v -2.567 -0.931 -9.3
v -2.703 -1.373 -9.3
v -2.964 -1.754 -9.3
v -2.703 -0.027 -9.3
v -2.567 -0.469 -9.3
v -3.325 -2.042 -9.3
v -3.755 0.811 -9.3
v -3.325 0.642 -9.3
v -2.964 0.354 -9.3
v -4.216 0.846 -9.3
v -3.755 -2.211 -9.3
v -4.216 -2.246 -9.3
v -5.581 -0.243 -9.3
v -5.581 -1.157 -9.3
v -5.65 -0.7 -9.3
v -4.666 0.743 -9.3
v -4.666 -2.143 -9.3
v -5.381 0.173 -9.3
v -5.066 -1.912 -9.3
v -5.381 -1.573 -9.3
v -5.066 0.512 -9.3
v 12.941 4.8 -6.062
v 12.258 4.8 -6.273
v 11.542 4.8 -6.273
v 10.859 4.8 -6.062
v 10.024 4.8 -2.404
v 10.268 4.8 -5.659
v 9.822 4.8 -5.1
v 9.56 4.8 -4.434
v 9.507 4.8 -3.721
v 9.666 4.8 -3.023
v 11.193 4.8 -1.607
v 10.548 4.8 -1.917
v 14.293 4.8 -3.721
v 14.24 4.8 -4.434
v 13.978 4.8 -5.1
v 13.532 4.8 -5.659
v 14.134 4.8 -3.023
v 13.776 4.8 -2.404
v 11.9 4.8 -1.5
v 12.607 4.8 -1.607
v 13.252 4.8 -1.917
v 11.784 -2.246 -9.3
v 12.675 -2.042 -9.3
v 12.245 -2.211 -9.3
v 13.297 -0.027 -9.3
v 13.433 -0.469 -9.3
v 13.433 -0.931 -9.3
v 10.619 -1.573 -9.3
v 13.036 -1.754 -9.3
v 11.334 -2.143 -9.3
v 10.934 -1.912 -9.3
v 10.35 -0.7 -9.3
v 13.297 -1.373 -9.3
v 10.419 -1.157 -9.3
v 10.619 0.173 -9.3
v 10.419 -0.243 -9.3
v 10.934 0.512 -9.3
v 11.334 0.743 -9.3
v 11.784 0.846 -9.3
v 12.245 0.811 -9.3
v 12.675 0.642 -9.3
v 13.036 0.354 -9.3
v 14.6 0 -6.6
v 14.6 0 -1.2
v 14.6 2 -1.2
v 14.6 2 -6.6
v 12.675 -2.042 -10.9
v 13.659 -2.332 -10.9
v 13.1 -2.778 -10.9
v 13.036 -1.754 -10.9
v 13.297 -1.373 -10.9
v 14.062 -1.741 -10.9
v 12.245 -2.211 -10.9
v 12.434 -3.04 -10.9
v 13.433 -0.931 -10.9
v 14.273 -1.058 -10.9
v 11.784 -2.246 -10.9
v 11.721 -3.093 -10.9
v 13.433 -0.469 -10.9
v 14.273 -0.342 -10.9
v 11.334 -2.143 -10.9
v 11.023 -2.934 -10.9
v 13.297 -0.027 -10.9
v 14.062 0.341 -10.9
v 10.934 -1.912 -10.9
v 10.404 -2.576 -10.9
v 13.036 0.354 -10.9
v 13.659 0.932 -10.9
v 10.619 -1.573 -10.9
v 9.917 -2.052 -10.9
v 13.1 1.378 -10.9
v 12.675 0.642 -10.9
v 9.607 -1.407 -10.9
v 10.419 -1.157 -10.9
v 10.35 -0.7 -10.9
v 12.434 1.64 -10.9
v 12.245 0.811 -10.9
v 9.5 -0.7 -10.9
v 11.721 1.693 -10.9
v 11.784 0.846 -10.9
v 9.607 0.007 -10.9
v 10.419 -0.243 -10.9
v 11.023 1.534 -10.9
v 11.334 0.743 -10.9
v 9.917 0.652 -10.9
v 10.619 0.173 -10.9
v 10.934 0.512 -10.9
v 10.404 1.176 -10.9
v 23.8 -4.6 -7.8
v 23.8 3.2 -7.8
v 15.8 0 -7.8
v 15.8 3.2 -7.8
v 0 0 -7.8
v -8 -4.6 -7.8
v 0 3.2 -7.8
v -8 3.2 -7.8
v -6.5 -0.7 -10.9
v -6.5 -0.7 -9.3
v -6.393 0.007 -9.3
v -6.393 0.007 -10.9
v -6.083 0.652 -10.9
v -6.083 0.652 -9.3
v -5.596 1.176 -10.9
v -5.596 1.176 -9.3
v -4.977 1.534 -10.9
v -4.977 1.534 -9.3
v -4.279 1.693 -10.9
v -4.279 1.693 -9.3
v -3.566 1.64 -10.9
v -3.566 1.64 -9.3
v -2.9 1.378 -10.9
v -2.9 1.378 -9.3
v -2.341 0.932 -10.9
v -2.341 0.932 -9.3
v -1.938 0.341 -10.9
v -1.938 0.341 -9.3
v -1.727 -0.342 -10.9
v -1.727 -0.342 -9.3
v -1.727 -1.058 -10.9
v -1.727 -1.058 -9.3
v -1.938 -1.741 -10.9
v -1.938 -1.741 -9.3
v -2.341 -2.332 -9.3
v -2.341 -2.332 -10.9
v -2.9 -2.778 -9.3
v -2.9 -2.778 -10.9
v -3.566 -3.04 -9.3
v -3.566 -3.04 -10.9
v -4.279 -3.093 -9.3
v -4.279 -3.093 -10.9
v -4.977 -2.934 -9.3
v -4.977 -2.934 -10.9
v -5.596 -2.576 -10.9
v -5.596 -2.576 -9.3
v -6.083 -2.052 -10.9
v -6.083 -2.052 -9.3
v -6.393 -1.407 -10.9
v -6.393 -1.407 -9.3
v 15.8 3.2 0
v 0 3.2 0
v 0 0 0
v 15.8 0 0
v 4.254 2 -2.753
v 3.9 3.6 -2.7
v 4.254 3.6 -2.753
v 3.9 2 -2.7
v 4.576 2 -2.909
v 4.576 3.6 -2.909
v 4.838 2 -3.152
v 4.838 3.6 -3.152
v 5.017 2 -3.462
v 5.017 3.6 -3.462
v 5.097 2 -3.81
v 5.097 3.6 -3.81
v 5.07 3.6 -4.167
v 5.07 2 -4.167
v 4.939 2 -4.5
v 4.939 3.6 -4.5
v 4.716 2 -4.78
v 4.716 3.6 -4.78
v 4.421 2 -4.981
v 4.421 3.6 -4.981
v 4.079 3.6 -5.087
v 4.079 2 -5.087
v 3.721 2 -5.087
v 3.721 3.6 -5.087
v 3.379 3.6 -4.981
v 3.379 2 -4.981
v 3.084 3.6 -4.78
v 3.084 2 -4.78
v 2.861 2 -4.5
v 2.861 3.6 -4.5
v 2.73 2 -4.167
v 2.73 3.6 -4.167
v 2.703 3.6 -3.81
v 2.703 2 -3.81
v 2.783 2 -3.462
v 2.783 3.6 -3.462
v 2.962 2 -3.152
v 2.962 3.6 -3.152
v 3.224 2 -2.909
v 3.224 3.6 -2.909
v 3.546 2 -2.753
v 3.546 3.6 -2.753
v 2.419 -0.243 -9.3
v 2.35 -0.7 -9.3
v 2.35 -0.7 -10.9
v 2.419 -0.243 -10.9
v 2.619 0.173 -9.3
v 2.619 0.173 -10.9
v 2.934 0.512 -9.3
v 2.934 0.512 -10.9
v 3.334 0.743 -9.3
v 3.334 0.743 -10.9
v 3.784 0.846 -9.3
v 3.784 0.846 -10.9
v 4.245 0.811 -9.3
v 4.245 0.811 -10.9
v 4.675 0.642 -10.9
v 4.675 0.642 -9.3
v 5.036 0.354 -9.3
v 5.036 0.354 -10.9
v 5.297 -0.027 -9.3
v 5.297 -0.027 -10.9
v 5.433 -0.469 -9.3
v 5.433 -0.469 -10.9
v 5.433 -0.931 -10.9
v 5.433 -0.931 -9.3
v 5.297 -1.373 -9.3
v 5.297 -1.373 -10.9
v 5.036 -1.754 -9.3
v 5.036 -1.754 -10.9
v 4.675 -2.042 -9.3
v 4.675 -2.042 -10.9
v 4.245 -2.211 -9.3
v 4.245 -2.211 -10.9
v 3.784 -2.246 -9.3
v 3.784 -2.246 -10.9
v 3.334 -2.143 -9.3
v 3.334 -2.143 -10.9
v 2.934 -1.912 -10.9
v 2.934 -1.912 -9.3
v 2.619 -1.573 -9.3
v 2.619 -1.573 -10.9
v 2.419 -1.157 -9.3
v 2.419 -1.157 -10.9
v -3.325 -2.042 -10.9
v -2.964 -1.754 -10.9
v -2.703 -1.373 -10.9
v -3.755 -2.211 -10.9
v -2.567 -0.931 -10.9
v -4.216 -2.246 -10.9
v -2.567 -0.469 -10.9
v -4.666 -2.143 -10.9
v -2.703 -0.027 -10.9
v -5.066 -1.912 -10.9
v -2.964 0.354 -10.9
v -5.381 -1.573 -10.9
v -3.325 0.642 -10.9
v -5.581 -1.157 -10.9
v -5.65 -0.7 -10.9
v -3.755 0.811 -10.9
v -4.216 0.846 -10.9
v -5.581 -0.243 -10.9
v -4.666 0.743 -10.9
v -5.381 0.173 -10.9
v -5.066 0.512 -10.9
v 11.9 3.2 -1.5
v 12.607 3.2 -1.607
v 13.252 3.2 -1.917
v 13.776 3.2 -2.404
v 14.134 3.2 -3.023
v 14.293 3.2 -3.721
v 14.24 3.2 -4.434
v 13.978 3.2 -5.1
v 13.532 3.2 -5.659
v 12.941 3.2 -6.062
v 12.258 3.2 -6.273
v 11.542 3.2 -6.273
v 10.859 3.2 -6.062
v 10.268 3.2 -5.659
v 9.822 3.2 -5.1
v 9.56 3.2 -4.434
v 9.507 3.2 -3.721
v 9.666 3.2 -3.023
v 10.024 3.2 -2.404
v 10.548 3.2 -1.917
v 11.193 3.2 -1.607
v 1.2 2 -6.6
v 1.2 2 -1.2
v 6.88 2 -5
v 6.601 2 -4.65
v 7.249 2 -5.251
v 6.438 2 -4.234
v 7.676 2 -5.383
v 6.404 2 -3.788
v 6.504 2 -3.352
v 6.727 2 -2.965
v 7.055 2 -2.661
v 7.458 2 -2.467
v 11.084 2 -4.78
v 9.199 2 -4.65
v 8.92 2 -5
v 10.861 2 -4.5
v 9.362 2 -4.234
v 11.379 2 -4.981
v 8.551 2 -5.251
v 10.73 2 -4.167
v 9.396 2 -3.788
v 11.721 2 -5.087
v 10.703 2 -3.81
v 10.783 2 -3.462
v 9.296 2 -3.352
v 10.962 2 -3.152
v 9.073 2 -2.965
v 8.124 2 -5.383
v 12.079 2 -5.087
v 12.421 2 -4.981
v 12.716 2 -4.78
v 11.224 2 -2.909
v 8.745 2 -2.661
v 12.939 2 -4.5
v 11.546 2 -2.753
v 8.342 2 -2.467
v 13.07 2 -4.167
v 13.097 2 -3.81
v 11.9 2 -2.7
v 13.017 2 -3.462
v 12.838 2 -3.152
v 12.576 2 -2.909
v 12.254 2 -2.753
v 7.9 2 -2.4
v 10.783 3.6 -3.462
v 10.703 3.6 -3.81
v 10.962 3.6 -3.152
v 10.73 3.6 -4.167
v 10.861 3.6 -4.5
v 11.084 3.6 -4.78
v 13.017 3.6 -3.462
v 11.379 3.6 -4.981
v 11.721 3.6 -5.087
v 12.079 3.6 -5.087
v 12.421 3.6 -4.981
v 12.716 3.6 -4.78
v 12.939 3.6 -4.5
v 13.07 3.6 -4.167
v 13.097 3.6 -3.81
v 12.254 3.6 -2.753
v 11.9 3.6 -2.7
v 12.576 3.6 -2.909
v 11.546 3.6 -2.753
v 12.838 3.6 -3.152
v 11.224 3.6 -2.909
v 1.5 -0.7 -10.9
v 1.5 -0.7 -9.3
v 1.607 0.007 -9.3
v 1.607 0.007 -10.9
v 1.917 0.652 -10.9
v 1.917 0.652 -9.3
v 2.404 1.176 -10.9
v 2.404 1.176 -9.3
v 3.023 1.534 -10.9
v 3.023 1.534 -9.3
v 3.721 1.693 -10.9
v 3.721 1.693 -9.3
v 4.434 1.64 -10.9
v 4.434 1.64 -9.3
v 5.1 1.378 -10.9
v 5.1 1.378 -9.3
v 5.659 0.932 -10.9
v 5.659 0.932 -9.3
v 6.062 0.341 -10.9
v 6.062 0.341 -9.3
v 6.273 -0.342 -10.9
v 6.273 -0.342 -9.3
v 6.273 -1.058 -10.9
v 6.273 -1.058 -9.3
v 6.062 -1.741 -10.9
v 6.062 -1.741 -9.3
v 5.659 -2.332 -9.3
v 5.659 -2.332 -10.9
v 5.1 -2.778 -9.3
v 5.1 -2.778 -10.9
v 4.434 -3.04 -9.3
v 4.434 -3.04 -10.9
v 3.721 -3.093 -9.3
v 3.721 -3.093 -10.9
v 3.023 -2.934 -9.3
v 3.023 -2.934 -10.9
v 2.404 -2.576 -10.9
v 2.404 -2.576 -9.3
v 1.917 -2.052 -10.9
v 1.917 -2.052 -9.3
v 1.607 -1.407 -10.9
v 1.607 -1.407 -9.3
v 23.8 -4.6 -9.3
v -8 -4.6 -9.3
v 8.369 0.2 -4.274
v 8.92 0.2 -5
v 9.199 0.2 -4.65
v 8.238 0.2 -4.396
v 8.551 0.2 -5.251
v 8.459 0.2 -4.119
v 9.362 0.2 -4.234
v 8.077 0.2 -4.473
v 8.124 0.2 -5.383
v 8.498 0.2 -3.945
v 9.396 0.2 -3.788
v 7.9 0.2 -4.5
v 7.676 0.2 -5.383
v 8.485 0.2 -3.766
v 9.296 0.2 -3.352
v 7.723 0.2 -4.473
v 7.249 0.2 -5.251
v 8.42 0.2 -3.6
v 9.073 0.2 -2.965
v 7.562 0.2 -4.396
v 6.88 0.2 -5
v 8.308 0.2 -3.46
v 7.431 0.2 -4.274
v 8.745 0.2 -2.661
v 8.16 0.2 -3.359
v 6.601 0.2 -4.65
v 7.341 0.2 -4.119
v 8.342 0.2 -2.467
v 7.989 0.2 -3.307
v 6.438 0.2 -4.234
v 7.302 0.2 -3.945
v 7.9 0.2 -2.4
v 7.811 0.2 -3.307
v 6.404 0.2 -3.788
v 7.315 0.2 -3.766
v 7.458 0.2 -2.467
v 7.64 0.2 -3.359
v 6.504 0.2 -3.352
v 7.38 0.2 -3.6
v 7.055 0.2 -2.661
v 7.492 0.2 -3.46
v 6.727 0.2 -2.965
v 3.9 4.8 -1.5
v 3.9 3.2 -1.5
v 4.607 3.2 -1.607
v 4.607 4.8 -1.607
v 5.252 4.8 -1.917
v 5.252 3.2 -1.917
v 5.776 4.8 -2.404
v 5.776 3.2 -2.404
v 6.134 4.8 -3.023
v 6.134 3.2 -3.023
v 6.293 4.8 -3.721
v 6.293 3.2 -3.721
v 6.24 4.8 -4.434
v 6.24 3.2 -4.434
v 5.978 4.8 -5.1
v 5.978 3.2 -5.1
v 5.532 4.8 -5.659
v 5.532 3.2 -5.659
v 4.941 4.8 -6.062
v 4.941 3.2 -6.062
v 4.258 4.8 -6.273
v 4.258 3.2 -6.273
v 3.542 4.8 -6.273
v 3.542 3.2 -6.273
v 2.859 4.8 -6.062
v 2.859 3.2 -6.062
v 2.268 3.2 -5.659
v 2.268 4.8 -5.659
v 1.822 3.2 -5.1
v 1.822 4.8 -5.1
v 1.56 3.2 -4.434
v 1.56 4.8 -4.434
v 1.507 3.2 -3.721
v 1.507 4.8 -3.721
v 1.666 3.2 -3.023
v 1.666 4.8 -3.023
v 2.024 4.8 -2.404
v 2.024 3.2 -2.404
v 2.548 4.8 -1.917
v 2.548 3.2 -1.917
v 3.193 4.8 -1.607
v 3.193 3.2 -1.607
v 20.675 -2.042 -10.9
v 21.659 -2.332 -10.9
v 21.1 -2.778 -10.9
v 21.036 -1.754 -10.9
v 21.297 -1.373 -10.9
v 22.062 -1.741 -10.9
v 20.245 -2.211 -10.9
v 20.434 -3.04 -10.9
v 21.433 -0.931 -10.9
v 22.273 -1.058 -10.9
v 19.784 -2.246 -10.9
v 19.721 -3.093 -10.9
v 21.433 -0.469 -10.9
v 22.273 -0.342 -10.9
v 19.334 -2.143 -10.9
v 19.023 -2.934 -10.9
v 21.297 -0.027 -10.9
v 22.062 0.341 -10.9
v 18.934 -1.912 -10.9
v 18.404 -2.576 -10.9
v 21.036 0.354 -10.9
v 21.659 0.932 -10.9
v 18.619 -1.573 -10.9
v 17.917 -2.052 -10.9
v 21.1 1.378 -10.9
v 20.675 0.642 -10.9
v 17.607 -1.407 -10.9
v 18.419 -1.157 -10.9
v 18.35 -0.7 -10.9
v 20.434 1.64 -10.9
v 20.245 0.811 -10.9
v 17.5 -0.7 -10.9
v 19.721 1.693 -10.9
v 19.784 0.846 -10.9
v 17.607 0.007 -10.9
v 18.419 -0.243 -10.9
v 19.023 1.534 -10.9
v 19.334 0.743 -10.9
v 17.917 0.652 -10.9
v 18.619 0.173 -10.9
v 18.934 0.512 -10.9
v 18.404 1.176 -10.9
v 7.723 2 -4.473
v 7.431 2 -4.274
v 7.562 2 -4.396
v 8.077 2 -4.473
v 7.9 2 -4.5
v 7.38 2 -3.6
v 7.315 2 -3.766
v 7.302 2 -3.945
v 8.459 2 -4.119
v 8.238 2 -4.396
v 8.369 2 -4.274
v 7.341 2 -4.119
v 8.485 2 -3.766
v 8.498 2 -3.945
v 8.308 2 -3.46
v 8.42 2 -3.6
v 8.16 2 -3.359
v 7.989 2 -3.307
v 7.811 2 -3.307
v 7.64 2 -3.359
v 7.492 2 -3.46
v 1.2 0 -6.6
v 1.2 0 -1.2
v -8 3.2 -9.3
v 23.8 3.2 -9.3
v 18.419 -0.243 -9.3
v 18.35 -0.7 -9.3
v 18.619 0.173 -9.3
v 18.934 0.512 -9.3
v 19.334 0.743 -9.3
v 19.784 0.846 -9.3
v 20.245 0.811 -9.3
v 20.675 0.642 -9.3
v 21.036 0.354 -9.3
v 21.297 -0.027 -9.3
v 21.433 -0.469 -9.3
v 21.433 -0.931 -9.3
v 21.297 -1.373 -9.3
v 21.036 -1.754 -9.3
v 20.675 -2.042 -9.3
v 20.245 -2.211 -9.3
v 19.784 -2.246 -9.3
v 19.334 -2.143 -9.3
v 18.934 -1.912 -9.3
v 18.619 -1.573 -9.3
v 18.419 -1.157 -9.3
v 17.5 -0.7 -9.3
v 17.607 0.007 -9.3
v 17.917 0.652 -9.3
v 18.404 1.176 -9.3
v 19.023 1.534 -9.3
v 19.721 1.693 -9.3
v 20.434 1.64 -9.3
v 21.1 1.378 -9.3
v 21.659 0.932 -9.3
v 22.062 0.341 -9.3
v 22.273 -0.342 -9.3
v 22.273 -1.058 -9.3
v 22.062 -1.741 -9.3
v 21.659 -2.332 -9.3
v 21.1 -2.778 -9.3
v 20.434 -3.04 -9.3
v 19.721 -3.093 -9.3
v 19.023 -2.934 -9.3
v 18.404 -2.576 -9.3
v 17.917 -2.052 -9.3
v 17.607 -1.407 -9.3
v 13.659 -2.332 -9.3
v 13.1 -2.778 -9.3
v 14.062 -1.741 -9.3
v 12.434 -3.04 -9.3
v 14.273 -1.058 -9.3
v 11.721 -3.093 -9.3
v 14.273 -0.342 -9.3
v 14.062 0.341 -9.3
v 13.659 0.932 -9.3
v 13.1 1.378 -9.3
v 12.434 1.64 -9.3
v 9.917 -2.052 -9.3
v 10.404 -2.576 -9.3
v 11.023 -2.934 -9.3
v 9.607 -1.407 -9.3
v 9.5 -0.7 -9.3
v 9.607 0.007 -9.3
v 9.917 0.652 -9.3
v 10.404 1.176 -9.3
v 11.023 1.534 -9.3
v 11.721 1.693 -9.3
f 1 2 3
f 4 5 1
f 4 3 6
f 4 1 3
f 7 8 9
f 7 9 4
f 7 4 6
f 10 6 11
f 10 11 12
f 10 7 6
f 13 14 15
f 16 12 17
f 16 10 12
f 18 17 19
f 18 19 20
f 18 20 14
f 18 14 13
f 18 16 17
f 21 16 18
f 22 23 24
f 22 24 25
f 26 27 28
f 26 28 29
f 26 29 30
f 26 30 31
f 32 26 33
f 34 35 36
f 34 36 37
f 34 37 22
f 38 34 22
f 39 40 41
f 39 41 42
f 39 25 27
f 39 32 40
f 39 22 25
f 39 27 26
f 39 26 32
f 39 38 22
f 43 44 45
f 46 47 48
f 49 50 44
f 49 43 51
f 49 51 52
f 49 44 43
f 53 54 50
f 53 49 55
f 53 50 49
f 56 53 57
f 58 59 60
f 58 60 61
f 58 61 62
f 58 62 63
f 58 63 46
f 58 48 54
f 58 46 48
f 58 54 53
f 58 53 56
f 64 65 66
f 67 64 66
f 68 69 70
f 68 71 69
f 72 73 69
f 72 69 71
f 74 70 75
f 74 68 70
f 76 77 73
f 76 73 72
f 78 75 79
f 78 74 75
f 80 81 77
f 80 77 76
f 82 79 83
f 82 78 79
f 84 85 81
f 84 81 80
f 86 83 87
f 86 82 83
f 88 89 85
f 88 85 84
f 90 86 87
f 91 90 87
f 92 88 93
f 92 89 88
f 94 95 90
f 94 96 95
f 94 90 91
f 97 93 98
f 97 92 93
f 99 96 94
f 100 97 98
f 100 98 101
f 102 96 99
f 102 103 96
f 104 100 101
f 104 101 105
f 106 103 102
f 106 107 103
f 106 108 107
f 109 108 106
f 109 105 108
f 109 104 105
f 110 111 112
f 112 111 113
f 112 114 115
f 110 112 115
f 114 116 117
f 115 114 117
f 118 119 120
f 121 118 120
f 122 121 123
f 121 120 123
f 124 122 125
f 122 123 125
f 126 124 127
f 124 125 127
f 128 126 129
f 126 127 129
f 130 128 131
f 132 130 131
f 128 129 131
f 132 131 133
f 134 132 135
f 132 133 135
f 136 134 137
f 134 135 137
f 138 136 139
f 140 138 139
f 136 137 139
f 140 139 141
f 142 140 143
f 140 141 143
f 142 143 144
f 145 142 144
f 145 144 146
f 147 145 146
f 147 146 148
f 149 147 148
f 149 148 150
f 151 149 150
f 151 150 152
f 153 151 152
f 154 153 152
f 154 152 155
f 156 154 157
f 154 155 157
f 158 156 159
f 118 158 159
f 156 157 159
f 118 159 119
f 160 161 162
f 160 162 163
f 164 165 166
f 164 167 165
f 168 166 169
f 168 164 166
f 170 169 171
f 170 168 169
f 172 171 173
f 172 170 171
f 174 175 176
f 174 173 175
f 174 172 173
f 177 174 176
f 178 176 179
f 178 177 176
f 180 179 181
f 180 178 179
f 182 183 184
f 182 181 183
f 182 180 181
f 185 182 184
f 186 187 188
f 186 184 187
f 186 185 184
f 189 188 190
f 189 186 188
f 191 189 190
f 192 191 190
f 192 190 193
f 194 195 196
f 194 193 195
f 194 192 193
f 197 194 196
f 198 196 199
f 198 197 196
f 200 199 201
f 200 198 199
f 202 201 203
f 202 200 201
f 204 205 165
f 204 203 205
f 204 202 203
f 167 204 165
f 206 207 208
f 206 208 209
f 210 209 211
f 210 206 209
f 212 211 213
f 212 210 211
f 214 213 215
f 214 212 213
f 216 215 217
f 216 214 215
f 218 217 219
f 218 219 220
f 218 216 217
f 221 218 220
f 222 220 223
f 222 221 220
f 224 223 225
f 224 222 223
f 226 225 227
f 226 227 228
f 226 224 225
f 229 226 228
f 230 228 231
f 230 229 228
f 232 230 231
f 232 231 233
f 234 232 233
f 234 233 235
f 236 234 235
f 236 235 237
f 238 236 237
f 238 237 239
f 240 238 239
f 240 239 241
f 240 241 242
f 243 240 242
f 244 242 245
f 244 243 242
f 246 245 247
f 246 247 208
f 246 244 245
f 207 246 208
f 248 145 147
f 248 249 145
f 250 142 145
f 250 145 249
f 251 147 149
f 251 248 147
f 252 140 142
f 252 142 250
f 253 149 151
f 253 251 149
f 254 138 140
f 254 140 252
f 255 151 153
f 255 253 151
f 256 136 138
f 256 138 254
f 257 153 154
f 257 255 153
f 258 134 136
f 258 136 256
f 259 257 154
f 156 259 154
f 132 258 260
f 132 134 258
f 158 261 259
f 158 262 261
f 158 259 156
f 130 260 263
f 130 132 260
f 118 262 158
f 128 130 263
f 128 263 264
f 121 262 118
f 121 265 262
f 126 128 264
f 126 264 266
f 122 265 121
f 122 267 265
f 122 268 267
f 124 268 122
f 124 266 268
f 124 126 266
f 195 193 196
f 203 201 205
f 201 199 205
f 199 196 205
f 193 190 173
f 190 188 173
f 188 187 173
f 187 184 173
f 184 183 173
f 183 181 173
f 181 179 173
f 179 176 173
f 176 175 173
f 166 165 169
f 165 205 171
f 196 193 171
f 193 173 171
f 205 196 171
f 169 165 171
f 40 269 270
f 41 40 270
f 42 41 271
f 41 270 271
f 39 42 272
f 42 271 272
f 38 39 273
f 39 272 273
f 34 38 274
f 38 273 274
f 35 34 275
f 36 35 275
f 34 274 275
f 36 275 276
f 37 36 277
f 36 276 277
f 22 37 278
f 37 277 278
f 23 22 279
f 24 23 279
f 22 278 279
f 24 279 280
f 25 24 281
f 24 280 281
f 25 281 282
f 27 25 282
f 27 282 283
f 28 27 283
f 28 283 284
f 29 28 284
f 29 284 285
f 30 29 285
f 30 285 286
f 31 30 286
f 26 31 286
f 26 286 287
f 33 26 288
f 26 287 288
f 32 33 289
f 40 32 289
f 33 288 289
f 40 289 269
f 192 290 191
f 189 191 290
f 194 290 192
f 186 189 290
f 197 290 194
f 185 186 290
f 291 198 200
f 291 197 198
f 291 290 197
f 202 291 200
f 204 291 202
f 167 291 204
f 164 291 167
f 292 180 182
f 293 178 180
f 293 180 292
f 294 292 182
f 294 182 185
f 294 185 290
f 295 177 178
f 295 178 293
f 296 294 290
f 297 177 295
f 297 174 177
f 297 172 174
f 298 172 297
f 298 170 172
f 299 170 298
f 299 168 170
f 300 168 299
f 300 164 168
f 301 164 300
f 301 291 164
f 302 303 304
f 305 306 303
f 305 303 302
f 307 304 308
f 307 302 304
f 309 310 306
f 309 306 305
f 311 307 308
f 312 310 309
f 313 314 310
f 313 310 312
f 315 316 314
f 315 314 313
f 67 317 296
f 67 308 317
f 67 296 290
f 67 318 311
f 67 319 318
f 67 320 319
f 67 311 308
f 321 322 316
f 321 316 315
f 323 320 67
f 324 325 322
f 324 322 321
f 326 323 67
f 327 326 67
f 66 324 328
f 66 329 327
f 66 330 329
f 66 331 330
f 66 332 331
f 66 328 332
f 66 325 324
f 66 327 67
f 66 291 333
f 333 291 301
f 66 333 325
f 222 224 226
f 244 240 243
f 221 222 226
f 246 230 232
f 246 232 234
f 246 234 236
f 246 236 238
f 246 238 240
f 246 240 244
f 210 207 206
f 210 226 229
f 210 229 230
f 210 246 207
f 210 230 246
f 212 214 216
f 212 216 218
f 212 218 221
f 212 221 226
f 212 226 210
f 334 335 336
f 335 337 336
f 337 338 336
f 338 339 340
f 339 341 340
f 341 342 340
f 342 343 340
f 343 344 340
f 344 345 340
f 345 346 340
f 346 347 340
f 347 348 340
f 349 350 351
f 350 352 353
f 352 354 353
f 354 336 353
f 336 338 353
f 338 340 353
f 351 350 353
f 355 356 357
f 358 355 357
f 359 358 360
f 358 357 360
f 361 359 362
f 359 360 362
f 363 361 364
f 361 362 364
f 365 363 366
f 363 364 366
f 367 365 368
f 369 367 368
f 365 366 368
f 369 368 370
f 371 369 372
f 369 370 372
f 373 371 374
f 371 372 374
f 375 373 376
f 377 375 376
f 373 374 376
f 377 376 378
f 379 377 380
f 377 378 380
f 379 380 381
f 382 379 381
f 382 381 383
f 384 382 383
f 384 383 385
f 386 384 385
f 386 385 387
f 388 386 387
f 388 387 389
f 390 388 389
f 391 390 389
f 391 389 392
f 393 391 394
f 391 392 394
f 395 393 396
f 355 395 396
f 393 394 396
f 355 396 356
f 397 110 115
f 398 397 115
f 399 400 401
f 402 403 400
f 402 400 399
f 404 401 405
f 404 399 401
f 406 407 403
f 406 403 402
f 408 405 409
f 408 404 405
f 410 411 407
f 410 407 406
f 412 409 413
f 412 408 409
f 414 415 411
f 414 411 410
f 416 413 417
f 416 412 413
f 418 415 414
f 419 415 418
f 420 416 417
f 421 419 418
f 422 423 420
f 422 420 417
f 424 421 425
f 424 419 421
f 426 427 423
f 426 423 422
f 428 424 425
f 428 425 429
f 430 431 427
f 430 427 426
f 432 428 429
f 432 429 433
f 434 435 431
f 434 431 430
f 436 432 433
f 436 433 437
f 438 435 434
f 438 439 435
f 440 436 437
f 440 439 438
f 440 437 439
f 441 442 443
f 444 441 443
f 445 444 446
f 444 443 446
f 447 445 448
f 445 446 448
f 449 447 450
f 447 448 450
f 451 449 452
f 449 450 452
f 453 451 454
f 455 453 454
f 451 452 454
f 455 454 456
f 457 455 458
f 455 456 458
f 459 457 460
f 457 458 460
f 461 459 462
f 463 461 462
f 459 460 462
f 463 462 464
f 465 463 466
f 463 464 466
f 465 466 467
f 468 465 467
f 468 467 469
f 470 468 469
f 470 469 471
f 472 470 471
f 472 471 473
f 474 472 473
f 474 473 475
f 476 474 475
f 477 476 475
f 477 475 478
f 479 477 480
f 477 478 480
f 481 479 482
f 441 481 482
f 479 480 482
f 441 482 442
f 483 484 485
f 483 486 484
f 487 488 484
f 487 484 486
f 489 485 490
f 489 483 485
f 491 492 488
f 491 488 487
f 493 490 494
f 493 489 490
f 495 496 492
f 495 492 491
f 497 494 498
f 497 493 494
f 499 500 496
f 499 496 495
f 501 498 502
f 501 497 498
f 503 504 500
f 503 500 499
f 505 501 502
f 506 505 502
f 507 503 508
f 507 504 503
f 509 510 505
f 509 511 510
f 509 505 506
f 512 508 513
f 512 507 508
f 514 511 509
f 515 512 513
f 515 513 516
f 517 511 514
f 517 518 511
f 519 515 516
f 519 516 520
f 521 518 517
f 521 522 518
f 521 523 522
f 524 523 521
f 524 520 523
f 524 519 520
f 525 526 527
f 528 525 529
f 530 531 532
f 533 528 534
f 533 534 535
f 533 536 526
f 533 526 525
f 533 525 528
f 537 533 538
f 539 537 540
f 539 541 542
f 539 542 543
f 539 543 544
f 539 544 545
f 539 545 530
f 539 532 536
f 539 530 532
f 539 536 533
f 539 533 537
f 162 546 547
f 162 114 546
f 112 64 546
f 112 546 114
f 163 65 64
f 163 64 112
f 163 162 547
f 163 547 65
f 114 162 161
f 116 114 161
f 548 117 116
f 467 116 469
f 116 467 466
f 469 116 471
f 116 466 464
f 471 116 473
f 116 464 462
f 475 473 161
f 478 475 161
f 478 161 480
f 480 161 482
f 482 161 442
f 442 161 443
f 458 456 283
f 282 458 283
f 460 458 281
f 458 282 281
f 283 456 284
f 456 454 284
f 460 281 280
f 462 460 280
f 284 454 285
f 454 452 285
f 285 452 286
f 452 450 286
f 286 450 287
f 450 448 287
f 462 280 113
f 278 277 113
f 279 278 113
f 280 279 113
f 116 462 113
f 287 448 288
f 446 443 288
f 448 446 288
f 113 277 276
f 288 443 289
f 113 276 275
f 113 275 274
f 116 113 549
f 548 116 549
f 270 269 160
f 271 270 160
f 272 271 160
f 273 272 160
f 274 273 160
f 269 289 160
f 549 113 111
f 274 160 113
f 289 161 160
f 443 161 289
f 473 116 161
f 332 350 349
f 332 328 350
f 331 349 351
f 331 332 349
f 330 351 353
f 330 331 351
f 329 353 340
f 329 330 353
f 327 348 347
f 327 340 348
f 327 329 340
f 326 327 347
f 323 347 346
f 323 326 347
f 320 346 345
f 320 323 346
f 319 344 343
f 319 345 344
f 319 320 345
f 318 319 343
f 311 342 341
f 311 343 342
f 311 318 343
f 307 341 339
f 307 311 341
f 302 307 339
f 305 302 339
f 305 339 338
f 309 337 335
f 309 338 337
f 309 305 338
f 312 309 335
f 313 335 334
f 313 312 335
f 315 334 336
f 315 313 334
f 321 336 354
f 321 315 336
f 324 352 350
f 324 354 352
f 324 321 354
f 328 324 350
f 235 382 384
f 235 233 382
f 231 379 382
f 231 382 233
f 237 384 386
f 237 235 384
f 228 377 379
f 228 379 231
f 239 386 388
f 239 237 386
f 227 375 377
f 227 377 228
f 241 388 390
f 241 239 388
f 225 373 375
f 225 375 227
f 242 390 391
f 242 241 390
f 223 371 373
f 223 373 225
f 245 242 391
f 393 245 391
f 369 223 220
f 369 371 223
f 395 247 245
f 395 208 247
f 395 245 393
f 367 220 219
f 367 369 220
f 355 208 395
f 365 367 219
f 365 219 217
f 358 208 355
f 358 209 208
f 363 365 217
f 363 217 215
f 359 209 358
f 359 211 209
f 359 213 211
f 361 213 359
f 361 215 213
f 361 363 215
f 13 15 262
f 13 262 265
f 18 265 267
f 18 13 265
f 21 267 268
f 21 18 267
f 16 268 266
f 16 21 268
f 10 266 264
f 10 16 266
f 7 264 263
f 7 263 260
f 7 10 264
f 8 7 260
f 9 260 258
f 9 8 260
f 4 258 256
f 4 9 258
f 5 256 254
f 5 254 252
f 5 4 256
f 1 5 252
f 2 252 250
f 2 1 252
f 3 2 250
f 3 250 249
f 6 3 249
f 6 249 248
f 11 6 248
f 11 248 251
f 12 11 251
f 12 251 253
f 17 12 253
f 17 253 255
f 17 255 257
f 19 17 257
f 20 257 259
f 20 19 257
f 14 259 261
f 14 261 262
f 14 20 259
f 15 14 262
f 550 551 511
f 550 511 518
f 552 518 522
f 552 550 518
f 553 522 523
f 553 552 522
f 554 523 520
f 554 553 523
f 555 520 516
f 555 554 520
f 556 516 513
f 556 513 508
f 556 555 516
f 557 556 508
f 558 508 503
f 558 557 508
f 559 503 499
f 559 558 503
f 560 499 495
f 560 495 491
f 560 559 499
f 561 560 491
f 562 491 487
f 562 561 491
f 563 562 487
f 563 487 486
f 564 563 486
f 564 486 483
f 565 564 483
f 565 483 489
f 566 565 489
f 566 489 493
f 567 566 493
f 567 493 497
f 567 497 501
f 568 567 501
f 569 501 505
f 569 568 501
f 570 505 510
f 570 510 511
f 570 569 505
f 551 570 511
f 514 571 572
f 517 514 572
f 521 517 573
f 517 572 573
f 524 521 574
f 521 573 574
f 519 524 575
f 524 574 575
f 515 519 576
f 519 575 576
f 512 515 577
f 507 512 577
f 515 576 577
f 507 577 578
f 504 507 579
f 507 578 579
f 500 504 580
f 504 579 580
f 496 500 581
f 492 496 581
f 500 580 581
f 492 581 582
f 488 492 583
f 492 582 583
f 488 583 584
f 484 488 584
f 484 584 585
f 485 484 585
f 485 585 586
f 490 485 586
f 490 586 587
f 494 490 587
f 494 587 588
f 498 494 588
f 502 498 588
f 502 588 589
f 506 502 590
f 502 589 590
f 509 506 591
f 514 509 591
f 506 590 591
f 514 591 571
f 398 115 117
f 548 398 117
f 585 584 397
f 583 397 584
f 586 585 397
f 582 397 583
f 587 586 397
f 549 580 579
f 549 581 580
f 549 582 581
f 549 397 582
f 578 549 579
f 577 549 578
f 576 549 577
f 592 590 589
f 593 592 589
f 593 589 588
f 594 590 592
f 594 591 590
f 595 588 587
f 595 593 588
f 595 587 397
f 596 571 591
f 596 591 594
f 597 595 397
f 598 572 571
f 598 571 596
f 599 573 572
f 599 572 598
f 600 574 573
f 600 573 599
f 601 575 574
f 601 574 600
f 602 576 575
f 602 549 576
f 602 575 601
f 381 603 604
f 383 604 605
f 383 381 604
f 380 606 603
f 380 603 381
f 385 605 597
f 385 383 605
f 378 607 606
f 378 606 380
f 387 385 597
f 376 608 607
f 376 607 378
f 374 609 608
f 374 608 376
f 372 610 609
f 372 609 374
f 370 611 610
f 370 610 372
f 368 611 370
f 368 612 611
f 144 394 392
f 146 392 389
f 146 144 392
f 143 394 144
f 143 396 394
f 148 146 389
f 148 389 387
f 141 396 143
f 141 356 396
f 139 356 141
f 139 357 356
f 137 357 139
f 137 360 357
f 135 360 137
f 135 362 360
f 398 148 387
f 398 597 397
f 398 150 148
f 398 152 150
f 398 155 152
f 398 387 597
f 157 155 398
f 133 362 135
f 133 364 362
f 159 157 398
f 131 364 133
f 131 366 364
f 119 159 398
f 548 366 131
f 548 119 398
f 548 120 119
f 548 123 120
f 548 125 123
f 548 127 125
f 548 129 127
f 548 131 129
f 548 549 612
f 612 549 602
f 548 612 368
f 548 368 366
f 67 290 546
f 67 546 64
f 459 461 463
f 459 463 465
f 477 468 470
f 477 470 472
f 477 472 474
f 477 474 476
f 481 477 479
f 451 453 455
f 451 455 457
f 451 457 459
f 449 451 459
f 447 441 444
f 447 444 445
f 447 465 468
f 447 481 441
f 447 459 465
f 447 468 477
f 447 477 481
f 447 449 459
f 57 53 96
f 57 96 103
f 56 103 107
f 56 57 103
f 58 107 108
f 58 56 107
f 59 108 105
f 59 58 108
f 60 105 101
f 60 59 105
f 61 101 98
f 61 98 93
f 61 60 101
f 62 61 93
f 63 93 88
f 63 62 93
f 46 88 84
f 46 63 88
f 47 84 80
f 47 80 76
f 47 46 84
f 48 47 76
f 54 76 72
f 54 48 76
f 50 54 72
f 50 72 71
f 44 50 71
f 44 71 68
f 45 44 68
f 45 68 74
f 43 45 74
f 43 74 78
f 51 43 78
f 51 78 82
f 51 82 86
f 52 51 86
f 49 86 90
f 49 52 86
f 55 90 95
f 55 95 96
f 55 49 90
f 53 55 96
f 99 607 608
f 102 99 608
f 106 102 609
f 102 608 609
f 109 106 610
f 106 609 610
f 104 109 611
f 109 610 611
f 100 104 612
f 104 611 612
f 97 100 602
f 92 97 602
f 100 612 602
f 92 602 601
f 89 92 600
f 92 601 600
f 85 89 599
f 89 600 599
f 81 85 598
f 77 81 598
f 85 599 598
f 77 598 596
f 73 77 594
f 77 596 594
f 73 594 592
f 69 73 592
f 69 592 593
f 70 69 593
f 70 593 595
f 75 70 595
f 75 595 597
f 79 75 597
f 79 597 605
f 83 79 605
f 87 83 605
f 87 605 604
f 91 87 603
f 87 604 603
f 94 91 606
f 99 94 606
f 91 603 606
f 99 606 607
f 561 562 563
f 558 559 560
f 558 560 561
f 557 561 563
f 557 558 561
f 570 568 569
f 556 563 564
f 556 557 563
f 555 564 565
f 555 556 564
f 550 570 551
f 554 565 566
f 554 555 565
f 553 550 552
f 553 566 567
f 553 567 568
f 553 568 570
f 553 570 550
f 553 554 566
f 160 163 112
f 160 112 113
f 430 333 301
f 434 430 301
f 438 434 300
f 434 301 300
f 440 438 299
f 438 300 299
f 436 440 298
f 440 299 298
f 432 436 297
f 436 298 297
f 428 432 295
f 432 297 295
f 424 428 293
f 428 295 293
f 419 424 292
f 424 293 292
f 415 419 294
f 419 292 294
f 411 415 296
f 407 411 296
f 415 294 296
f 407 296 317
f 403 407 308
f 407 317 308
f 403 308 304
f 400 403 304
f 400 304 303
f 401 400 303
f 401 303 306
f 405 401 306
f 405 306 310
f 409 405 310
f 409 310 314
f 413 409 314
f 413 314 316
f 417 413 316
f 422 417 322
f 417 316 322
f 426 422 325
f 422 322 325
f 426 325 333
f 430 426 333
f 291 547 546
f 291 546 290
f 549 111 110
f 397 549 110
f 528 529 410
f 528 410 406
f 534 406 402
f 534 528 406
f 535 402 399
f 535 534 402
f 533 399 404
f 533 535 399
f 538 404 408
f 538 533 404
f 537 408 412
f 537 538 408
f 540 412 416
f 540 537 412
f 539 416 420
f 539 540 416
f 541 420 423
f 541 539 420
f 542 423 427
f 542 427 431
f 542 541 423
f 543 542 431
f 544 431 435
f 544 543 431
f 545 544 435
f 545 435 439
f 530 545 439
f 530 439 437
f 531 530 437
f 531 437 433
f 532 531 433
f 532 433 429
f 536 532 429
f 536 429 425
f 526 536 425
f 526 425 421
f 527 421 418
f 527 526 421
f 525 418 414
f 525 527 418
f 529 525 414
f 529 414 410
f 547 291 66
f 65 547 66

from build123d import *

# Parameters (mm, degrees)
SKETCH1_W            = 15.8
SKETCH1_H            = 3.2
BOSS_EXTRUDE1_DEPTH  = 7.8
SKETCH2_R            = 2.4
BOSS_EXTRUDE2_DEPTH  = 1.6
LPATTERN1_COUNT      = 2
LPATTERN1_PITCH      = 8
LPATTERN1_COUNT_DIR2 = 6
LPATTERN1_PITCH_DIR2 = 8
SHELL1_T             = -1.2
SKETCH3_R            = 1.5
SKETCH3_R_2          = 0.6
BOSS_EXTRUDE3_DEPTH  = 1.8
BOSS_EXTRUDE4_DEPTH  = 1.5
SKETCH5_R            = 2.4
SKETCH5_R_2          = 1.55
BOSS_EXTRUDE5_DEPTH  = 1.6
LPATTERN2_COUNT      = 4
LPATTERN2_PITCH      = 8


with BuildPart() as part:
    # Sketch1 → Boss-Extrude1 (new body)
    with BuildSketch(Plane.XY):
        with Locations((7.9, 1.6)):
            Rectangle(SKETCH1_W, SKETCH1_H)
    extrude(amount=-BOSS_EXTRUDE1_DEPTH)

    # Sketch2 → Boss-Extrude2 (add)
    with BuildSketch(Plane(origin=(0, 3.2, 0), x_dir=(1, 0, 0), z_dir=(0, 1, 0))):
        with Locations(Location((3.9, 3.9, 0), (0, 0, 270))):
            Circle(SKETCH2_R)
    boss_extrude2 = extrude(amount=BOSS_EXTRUDE2_DEPTH)

    # LPattern1: Boss-Extrude2 2 × 6, 10 skipped
    with Locations(*[(j * LPATTERN1_PITCH_DIR2, 0, i * LPATTERN1_PITCH) for i in range(LPATTERN1_COUNT) for j in range(LPATTERN1_COUNT_DIR2) if (i, j) not in ((0, 0), (0, 2), (0, 3), (0, 4), (0, 5), (1, 0), (1, 1), (1, 2), (1, 3), (1, 4), (1, 5))]):
        add(boss_extrude2)

    # Shell1
    shell1_openings = [part.faces().sort_by_distance(p)[0] for p in [
        (7.9, 0, -3.9),
    ]]
    offset(amount=SHELL1_T, openings=shell1_openings, kind=Kind.INTERSECTION)

    # Sketch3 → Boss-Extrude3 (add)
    with BuildSketch(Plane.XZ.offset(-2)):
        with Locations(Location((7.9, -3.9, 0), (0, 0, 90))):
            Circle(SKETCH3_R)
        with Locations(Location((7.9, -3.9, 0), (0, 0, 270))):
            Circle(SKETCH3_R_2, mode=Mode.SUBTRACT)
    extrude(amount=BOSS_EXTRUDE3_DEPTH)

    # Sketch4 → Boss-Extrude4 (add)
    with BuildSketch(Plane(origin=(0, 0, -7.8), x_dir=(-1, 0, 0), z_dir=(0, 0, -1))):
        Polygon((-15.8, 3.2), (-23.8, 3.2), (-23.8, -4.6), (8, -4.6), (8, 3.2), (0, 3.2), align=None)
    extrude(amount=BOSS_EXTRUDE4_DEPTH)

    # Sketch5 → Boss-Extrude5 (add)
    with BuildSketch(Plane(origin=(0, 0, -9.3), x_dir=(-1, 0, 0), z_dir=(0, 0, -1))):
        with Locations((4.1, -0.7)):
            Circle(SKETCH5_R)
        with Locations((4.1, -0.7)):
            Circle(SKETCH5_R_2, mode=Mode.SUBTRACT)
    boss_extrude5 = extrude(amount=BOSS_EXTRUDE5_DEPTH)

    # LPattern2: Boss-Extrude5 ×4
    with Locations(*[(i * LPATTERN2_PITCH, 0, 0) for i in range(1, LPATTERN2_COUNT)]):
        add(boss_extrude5)


solid = part.part
